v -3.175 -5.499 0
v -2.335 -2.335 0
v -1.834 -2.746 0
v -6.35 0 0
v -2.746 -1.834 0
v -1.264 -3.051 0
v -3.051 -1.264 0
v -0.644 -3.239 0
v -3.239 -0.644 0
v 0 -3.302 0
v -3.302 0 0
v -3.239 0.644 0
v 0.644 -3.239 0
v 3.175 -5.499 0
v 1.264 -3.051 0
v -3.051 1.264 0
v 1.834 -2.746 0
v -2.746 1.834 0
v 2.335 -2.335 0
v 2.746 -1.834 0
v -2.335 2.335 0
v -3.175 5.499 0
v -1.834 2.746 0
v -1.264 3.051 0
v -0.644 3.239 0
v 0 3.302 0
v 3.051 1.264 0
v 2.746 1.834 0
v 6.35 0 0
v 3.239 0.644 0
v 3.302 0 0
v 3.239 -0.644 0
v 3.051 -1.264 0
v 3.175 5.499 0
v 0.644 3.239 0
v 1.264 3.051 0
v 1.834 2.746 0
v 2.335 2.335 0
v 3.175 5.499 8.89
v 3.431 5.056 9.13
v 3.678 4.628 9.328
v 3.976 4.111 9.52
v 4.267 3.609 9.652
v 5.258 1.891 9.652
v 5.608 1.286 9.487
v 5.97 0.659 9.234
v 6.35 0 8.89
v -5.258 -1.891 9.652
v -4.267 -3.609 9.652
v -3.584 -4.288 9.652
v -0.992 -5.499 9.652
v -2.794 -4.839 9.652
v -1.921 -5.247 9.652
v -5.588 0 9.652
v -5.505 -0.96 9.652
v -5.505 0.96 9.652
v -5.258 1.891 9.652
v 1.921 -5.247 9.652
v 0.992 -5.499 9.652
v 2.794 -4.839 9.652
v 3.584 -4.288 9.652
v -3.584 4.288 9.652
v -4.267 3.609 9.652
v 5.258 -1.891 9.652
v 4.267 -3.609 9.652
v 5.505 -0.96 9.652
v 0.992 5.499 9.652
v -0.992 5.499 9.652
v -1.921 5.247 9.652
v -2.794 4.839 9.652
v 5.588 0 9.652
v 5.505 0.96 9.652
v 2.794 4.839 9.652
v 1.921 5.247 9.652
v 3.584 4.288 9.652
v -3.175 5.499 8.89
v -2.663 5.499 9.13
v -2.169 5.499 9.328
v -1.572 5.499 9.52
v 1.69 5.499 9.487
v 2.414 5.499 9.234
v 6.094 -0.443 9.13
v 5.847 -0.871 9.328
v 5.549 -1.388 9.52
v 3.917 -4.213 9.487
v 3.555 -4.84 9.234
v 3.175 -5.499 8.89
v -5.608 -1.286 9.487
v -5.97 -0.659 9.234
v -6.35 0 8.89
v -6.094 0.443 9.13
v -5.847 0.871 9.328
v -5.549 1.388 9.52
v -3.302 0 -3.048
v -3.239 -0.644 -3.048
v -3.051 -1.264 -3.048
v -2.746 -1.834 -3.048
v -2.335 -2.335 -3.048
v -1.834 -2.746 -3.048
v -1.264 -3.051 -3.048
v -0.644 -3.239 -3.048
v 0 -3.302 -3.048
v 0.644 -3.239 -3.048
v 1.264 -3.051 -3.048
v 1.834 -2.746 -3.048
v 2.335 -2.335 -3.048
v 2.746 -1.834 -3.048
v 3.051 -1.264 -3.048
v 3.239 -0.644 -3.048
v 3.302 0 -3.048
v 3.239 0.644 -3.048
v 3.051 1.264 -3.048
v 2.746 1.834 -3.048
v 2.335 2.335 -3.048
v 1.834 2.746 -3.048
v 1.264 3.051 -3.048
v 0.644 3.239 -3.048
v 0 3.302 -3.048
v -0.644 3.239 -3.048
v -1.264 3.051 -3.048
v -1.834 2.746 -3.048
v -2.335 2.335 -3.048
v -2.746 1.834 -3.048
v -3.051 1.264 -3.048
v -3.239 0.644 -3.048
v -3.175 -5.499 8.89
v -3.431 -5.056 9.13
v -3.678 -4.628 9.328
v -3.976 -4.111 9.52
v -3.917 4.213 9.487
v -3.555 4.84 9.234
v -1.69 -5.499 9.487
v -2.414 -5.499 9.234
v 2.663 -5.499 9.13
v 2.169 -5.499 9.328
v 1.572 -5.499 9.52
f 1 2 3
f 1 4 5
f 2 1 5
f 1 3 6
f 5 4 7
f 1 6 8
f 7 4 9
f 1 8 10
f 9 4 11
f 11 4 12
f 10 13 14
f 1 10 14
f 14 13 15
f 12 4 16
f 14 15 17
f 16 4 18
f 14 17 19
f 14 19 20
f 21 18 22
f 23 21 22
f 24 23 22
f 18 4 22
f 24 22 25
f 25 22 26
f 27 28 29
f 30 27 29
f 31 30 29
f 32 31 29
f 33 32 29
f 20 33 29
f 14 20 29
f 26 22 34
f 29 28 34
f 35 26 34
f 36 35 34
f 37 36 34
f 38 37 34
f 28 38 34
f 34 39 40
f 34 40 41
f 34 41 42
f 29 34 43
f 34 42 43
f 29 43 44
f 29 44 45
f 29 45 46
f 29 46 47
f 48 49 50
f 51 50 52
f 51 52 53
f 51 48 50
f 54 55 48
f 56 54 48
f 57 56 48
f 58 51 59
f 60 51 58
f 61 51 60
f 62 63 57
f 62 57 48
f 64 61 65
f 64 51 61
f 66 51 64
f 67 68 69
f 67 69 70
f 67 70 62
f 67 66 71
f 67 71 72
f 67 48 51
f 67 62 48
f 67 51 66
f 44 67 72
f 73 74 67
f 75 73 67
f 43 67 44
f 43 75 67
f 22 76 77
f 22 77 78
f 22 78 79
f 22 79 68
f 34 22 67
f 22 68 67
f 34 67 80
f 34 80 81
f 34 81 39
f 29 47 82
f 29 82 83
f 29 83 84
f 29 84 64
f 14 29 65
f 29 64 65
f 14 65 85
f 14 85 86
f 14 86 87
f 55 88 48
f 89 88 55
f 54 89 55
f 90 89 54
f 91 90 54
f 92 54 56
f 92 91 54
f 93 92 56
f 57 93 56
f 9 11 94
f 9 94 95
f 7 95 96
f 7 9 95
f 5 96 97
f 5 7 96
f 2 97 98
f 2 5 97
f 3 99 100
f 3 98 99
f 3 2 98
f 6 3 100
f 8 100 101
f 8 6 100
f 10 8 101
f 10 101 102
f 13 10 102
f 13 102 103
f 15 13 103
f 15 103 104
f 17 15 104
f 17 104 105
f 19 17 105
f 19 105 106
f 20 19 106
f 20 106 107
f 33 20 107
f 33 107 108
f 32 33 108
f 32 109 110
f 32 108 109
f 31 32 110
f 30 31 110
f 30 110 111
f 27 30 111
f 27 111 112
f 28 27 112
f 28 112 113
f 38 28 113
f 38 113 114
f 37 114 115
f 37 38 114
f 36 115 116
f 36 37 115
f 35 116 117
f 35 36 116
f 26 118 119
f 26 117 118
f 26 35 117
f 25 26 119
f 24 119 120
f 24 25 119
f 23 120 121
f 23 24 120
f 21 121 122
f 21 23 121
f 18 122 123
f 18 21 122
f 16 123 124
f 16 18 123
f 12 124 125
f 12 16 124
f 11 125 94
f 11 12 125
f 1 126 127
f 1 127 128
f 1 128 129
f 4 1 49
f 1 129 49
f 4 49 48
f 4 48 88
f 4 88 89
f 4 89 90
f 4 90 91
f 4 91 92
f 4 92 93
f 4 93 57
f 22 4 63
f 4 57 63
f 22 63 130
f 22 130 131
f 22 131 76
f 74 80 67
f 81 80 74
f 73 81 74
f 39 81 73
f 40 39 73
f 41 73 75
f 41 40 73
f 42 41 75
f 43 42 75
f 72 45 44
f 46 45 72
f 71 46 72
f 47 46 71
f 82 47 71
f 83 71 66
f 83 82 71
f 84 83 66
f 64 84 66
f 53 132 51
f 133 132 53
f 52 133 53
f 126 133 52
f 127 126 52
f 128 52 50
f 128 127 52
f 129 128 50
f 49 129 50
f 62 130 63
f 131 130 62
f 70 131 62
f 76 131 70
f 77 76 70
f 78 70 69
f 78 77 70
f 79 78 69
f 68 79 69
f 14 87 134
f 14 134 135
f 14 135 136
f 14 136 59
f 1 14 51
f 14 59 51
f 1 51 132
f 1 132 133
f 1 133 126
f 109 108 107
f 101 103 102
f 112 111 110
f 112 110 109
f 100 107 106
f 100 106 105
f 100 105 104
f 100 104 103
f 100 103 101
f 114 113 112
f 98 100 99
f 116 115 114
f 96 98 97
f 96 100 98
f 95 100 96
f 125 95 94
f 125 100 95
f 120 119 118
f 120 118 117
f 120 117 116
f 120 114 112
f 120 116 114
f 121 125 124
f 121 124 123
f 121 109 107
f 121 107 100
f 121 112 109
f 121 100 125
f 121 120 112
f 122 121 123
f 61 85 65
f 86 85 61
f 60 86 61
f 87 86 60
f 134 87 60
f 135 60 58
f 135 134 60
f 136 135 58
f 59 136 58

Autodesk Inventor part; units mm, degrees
ref_plane "YZ Plane" through (0, 0, 0) normal (1, 0, 0) x (0, 1, 0)
ref_plane "XZ Plane" through (0, 0, 0) normal (0, 1, 0) x (-1, 0, 0)
ref_plane "XY Plane" through (0, 0, 0) normal (0, 0, 1) x (1, 0, 0)
sketch "Sketch1" plane through (0, 0, 0) normal (0, 0, 1) x (1, 0, 0)
  circle A0 centre (0, 0) radius 6.35
  dimension "d0" = 12.7
extrude "Extrusion1" add sketch "Sketch1" along normal blind 9.652
sketch "Sketch2" plane through (0, 0, 0) normal (0, 0, -1) x (-1, 0, 0)
  circle A0 centre (0, 0) radius 3.302
  dimension "d3" = 6.604
extrude "Extrusion2" add sketch "Sketch2" along normal blind 3.048
chamfer "Chamfer1" distance 0.762 angle 45 1 edges at (-6.35, 0, 9.652) measured on face at (-1.8127, -0.4771, 9.652)
sketch "Sketch3" plane through (0, 0, 9.652) normal (0, 0, 1) x (1, 0, 0)
  circle A0 centre (0, 0) radius 6.35 projected
  line L0 (3.175, 5.4993) -> (6.35, 0)
  line L1 (6.35, 0) -> (3.175, -5.4993)
  line L2 (3.175, -5.4993) -> (-3.175, -5.4993)
  line L3 (-3.175, -5.4993) -> (-6.35, 0)
  line L4 (-6.35, 0) -> (-3.175, 5.4993)
  line L5 (-3.175, 5.4993) -> (3.175, 5.4993)
  line L6 (-10.603, 0.0515) -> (9.8262, 0.0515) construction
extrude "Extrusion3" cut sketch "Sketch3" against normal up to surface (9.652 mm away) contours L0 A0 | A0 L1 | L5 A0 | A0 L2 | L4 A0 | A0 L3
sketch "Sketch5" plane through (0, 0, -3.048) normal (0, 0, -1) x (-1, 0, 0)
  circle A0 centre (0, 0) radius 3.937
  dimension "d15" = 7.874
extrude "Extrusion5" [suppressed]
chamfer "Chamfer2" [suppressed]
thread "Thread1"
sketch "Sketch6" plane through (-3.175, 5.4993, 11.0682) normal (0, 1, 0) x (1, 0, 0)
  line L0 (0, 0) -> (0, 9.652)
  line L1 (0, 7.7662) -> (6.35, 7.7662)
  line L2 (6.35, 0) -> (6.35, 9.652)
  line L3 (-0.762, 14.1162) -> (7.112, 14.1162)
  line L4 (-0.762, 14.1162) -> (7.112, 14.1162) projected
  point P0 (3.175, 0)
  point P1 (3.175, 7.7662)
  dimension "d25" = 6.35
  dimension "d36" = 6.35
  dimension "d37" = 3.175
  dimension "d45" = 0
hole "Hole1" [suppressed]
pattern_circular "Circular Pattern1" [suppressed]
sketch "Sketch7" plane through (0, 0, 9.652) normal (0, 0, 1) x (1, 0, 0)
  point P0 (0, 0)
  point P1 (0, 0)
hole "Hole2" [suppressed]
properties part number "13_5_CylinderBase"
